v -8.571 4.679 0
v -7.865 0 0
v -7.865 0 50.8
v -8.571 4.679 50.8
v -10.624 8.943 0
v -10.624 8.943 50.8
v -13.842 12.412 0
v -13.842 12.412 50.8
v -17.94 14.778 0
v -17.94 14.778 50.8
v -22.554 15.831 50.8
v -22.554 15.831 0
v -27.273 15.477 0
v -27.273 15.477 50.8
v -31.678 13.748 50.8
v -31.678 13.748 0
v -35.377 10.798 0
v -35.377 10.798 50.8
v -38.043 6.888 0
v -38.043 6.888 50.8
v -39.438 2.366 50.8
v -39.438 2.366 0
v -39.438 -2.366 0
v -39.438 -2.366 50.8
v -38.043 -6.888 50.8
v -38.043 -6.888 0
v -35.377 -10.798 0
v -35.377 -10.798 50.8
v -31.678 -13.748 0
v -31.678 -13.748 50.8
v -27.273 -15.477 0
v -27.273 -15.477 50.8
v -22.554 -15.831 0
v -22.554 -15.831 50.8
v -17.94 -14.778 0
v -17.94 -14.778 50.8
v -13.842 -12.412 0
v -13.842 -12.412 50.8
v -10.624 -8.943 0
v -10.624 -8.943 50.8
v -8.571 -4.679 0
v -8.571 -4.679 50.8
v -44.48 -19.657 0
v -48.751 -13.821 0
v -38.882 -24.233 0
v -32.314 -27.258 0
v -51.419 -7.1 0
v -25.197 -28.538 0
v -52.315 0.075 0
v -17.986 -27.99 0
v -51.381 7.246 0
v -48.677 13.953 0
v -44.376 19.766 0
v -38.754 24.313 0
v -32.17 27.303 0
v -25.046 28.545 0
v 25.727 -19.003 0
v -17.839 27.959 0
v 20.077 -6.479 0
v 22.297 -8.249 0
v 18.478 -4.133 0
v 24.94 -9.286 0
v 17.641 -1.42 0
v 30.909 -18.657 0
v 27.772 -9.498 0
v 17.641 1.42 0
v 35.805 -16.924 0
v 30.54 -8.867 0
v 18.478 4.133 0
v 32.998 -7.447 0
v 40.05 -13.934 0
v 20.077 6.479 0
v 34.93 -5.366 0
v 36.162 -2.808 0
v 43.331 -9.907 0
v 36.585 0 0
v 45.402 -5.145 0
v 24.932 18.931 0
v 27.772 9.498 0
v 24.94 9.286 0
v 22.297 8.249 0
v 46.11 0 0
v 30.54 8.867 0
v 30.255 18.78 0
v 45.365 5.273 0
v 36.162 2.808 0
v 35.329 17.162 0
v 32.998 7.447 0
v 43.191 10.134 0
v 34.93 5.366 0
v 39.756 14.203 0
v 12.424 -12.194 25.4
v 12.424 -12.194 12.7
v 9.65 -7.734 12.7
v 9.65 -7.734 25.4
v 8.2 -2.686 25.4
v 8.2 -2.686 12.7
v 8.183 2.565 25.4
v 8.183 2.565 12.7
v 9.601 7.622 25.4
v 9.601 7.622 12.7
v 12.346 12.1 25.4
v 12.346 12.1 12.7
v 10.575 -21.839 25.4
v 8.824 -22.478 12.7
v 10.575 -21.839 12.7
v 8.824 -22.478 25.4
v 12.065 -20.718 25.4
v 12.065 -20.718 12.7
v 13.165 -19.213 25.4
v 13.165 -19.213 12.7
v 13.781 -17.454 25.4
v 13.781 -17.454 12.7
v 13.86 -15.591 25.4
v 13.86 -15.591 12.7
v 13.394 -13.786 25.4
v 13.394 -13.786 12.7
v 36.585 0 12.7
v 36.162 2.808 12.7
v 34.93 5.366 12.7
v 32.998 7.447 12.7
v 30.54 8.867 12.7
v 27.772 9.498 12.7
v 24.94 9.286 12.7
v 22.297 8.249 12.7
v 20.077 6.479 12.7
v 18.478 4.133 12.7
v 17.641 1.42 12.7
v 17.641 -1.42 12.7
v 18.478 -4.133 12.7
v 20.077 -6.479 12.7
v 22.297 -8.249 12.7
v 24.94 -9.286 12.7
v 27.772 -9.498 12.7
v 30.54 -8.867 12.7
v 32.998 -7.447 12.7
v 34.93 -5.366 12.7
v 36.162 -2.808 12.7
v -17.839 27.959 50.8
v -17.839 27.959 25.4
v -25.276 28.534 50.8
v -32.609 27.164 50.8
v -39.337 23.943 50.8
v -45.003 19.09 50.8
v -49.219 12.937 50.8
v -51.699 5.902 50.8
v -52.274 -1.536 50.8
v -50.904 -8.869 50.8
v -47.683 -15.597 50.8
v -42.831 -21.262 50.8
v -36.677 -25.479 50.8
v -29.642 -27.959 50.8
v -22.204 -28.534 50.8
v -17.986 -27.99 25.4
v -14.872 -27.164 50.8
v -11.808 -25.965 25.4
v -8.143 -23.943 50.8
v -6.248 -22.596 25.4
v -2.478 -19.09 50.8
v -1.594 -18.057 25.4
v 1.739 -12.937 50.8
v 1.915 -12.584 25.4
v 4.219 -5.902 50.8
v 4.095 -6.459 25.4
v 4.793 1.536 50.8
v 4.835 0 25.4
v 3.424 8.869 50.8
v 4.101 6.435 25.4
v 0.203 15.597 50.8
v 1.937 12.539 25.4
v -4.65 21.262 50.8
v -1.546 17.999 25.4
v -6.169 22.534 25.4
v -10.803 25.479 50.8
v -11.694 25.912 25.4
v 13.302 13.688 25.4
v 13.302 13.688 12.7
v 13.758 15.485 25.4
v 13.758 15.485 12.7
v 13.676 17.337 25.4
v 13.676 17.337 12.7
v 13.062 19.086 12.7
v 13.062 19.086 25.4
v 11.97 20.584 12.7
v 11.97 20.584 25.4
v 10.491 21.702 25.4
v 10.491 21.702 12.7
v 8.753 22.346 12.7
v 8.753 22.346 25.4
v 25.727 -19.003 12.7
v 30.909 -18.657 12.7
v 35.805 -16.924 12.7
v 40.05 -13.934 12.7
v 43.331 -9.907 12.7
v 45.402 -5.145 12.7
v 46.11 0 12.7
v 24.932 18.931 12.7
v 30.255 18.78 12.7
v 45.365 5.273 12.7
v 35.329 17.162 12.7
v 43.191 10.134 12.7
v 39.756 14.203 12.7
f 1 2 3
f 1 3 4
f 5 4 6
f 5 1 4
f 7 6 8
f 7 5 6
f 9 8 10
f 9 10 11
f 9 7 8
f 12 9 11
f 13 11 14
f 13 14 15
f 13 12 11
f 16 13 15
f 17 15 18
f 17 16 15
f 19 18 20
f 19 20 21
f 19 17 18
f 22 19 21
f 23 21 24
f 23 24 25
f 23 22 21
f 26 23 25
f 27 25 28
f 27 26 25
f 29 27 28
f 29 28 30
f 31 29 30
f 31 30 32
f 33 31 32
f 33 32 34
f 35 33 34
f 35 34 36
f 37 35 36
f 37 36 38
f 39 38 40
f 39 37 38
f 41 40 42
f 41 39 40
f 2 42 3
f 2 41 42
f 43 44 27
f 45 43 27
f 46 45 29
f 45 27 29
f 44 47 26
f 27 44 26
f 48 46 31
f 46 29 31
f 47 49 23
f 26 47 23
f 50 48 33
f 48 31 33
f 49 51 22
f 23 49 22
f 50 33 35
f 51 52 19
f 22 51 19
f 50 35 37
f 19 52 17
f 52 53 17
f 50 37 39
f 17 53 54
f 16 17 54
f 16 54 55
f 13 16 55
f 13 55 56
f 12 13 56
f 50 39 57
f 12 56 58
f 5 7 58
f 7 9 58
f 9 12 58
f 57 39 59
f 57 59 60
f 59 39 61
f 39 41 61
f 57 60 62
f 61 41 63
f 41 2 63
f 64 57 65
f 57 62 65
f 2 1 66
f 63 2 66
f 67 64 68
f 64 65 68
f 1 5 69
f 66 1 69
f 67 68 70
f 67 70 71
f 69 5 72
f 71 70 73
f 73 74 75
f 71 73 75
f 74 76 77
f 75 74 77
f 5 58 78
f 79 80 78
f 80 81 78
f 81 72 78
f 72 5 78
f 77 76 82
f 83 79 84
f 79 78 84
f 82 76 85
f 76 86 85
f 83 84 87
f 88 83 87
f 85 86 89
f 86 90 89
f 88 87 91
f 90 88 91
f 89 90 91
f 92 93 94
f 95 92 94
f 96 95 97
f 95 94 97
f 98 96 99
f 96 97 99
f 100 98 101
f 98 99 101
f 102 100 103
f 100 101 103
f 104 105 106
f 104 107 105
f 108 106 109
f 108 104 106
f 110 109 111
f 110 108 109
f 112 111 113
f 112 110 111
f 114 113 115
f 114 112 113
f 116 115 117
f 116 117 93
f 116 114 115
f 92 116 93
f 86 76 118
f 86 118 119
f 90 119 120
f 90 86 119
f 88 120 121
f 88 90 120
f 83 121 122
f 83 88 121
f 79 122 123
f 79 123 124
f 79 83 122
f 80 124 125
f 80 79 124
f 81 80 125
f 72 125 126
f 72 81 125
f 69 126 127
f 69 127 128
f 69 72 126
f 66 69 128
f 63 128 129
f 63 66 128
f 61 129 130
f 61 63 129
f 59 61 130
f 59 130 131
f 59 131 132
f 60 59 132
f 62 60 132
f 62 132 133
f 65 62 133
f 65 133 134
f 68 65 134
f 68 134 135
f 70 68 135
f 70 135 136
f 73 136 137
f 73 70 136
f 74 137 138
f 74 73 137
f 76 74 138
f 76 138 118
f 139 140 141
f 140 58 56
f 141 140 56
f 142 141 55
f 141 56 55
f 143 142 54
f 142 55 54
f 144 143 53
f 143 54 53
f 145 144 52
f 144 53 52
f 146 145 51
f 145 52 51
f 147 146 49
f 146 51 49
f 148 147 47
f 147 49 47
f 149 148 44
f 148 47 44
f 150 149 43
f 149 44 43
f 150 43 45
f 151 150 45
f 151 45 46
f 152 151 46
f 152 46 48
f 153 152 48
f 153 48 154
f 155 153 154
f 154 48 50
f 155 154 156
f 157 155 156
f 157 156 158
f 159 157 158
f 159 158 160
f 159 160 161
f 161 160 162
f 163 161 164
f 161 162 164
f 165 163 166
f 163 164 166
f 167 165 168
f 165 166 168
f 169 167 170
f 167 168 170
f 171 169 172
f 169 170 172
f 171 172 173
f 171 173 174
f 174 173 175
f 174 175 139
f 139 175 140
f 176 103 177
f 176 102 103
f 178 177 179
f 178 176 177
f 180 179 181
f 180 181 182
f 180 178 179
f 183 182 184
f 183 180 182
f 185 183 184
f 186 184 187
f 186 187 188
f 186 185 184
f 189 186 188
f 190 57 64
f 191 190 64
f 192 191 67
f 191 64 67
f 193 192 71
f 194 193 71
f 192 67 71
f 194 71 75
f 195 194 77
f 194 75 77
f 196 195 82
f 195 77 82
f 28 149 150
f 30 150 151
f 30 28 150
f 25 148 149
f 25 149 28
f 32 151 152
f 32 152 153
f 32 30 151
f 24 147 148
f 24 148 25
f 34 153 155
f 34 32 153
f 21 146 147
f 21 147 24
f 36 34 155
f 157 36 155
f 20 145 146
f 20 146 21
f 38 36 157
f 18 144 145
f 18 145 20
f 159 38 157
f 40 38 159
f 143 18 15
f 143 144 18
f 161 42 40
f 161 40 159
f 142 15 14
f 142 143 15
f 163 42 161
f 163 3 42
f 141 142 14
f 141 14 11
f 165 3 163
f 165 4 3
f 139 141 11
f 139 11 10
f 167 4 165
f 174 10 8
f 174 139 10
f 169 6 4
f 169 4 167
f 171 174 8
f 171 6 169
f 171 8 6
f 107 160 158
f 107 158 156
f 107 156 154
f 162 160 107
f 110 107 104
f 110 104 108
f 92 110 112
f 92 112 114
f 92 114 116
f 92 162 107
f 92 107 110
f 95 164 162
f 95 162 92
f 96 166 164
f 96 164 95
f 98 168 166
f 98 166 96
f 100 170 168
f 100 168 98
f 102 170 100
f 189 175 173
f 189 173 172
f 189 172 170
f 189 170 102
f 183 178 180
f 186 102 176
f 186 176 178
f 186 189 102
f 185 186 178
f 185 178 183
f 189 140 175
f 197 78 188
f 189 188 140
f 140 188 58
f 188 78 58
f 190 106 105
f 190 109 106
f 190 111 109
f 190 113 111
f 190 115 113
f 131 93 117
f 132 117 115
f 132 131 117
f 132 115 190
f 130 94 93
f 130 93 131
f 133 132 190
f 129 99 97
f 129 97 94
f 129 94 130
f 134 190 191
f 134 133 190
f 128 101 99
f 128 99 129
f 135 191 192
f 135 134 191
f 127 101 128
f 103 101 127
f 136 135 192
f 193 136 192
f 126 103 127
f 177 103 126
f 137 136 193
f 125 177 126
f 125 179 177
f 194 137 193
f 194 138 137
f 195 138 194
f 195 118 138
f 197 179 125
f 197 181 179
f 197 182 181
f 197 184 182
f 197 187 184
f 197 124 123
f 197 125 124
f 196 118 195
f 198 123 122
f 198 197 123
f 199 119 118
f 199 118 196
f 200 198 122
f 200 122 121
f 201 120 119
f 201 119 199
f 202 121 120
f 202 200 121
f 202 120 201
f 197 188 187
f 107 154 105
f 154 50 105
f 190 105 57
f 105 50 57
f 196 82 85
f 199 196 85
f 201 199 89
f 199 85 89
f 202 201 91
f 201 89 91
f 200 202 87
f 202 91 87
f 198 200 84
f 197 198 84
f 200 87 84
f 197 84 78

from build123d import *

# Parameters (mm, degrees)
F0_R     = 15.875
F1_DEPTH = 50.8
F2_DEPTH = 25.4
F0_R_2   = 9.525
F3_DEPTH = 12.7
F4_R     = 6.35


with BuildPart() as f1:
    # F0 (on Top) → F1 (new body)
    with BuildSketch(Plane.XY):
        with BuildLine():
            ThreePointArc((4.8347544076, 0), (-1.5460097383, 17.998514379), (-17.8386678043, 27.9589342538))
            ThreePointArc((-17.8386678043, 27.9589342538), (-52.3151461351, 0.07539214), (-17.9862828844, -27.9896862818))
            ThreePointArc((-17.9862828844, -27.9896862818), (-1.5935741791, -18.0570088971), (4.8347544076, 0))
        make_face()
        with Locations((-23.7402455924, 0)):
            Circle(F0_R, mode=Mode.SUBTRACT)
    extrude(amount=F1_DEPTH)

    # F0 (on Top) → F2 (join)
    with BuildSketch(Plane.XY):
        with BuildLine():
            ThreePointArc((25.7271171156, -19.0033307041), (8.0139347128, -0.3990640994), (24.9322885076, 18.9308316998))
            Line((24.9322885076, 18.9308316998), (-17.8386678043, 27.9589342538))
            ThreePointArc((-17.8386678043, 27.9589342538), (-1.5460097383, 17.998514379), (4.8347544076, 0))
            ThreePointArc((4.8347544076, 0), (-1.5935741791, -18.0570088971), (-17.9862828844, -27.9896862818))
            Line((-17.9862828844, -27.9896862818), (25.7271171156, -19.0033307041))
        make_face()
    extrude(amount=F2_DEPTH)

    # F0 (on Top) → F3 (join)
    with BuildSketch(Plane.XY):
        with BuildLine():
            ThreePointArc((25.7271171156, -19.0033307041), (40.0504387542, -13.9335788729), (46.1097544076, 0))
            ThreePointArc((46.1097544076, 0), (39.7557040492, 14.2026533682), (24.9322885076, 18.9308316998))
            ThreePointArc((24.9322885076, 18.9308316998), (8.0139347128, -0.3990640994), (25.7271171156, -19.0033307041))
        make_face()
        with Locations((27.0597544076, 0)):
            Circle(F0_R_2, mode=Mode.SUBTRACT)
    extrude(amount=F3_DEPTH)

    # F4
    f4_edges = [f1.edges().sort_by_distance(p)[0] for p in [
        (25.727117, -19.003331, 19.05),
        (24.932289, 18.930832, 19.05),
    ]]
    fillet(f4_edges, radius=F4_R)


solid = f1.part
